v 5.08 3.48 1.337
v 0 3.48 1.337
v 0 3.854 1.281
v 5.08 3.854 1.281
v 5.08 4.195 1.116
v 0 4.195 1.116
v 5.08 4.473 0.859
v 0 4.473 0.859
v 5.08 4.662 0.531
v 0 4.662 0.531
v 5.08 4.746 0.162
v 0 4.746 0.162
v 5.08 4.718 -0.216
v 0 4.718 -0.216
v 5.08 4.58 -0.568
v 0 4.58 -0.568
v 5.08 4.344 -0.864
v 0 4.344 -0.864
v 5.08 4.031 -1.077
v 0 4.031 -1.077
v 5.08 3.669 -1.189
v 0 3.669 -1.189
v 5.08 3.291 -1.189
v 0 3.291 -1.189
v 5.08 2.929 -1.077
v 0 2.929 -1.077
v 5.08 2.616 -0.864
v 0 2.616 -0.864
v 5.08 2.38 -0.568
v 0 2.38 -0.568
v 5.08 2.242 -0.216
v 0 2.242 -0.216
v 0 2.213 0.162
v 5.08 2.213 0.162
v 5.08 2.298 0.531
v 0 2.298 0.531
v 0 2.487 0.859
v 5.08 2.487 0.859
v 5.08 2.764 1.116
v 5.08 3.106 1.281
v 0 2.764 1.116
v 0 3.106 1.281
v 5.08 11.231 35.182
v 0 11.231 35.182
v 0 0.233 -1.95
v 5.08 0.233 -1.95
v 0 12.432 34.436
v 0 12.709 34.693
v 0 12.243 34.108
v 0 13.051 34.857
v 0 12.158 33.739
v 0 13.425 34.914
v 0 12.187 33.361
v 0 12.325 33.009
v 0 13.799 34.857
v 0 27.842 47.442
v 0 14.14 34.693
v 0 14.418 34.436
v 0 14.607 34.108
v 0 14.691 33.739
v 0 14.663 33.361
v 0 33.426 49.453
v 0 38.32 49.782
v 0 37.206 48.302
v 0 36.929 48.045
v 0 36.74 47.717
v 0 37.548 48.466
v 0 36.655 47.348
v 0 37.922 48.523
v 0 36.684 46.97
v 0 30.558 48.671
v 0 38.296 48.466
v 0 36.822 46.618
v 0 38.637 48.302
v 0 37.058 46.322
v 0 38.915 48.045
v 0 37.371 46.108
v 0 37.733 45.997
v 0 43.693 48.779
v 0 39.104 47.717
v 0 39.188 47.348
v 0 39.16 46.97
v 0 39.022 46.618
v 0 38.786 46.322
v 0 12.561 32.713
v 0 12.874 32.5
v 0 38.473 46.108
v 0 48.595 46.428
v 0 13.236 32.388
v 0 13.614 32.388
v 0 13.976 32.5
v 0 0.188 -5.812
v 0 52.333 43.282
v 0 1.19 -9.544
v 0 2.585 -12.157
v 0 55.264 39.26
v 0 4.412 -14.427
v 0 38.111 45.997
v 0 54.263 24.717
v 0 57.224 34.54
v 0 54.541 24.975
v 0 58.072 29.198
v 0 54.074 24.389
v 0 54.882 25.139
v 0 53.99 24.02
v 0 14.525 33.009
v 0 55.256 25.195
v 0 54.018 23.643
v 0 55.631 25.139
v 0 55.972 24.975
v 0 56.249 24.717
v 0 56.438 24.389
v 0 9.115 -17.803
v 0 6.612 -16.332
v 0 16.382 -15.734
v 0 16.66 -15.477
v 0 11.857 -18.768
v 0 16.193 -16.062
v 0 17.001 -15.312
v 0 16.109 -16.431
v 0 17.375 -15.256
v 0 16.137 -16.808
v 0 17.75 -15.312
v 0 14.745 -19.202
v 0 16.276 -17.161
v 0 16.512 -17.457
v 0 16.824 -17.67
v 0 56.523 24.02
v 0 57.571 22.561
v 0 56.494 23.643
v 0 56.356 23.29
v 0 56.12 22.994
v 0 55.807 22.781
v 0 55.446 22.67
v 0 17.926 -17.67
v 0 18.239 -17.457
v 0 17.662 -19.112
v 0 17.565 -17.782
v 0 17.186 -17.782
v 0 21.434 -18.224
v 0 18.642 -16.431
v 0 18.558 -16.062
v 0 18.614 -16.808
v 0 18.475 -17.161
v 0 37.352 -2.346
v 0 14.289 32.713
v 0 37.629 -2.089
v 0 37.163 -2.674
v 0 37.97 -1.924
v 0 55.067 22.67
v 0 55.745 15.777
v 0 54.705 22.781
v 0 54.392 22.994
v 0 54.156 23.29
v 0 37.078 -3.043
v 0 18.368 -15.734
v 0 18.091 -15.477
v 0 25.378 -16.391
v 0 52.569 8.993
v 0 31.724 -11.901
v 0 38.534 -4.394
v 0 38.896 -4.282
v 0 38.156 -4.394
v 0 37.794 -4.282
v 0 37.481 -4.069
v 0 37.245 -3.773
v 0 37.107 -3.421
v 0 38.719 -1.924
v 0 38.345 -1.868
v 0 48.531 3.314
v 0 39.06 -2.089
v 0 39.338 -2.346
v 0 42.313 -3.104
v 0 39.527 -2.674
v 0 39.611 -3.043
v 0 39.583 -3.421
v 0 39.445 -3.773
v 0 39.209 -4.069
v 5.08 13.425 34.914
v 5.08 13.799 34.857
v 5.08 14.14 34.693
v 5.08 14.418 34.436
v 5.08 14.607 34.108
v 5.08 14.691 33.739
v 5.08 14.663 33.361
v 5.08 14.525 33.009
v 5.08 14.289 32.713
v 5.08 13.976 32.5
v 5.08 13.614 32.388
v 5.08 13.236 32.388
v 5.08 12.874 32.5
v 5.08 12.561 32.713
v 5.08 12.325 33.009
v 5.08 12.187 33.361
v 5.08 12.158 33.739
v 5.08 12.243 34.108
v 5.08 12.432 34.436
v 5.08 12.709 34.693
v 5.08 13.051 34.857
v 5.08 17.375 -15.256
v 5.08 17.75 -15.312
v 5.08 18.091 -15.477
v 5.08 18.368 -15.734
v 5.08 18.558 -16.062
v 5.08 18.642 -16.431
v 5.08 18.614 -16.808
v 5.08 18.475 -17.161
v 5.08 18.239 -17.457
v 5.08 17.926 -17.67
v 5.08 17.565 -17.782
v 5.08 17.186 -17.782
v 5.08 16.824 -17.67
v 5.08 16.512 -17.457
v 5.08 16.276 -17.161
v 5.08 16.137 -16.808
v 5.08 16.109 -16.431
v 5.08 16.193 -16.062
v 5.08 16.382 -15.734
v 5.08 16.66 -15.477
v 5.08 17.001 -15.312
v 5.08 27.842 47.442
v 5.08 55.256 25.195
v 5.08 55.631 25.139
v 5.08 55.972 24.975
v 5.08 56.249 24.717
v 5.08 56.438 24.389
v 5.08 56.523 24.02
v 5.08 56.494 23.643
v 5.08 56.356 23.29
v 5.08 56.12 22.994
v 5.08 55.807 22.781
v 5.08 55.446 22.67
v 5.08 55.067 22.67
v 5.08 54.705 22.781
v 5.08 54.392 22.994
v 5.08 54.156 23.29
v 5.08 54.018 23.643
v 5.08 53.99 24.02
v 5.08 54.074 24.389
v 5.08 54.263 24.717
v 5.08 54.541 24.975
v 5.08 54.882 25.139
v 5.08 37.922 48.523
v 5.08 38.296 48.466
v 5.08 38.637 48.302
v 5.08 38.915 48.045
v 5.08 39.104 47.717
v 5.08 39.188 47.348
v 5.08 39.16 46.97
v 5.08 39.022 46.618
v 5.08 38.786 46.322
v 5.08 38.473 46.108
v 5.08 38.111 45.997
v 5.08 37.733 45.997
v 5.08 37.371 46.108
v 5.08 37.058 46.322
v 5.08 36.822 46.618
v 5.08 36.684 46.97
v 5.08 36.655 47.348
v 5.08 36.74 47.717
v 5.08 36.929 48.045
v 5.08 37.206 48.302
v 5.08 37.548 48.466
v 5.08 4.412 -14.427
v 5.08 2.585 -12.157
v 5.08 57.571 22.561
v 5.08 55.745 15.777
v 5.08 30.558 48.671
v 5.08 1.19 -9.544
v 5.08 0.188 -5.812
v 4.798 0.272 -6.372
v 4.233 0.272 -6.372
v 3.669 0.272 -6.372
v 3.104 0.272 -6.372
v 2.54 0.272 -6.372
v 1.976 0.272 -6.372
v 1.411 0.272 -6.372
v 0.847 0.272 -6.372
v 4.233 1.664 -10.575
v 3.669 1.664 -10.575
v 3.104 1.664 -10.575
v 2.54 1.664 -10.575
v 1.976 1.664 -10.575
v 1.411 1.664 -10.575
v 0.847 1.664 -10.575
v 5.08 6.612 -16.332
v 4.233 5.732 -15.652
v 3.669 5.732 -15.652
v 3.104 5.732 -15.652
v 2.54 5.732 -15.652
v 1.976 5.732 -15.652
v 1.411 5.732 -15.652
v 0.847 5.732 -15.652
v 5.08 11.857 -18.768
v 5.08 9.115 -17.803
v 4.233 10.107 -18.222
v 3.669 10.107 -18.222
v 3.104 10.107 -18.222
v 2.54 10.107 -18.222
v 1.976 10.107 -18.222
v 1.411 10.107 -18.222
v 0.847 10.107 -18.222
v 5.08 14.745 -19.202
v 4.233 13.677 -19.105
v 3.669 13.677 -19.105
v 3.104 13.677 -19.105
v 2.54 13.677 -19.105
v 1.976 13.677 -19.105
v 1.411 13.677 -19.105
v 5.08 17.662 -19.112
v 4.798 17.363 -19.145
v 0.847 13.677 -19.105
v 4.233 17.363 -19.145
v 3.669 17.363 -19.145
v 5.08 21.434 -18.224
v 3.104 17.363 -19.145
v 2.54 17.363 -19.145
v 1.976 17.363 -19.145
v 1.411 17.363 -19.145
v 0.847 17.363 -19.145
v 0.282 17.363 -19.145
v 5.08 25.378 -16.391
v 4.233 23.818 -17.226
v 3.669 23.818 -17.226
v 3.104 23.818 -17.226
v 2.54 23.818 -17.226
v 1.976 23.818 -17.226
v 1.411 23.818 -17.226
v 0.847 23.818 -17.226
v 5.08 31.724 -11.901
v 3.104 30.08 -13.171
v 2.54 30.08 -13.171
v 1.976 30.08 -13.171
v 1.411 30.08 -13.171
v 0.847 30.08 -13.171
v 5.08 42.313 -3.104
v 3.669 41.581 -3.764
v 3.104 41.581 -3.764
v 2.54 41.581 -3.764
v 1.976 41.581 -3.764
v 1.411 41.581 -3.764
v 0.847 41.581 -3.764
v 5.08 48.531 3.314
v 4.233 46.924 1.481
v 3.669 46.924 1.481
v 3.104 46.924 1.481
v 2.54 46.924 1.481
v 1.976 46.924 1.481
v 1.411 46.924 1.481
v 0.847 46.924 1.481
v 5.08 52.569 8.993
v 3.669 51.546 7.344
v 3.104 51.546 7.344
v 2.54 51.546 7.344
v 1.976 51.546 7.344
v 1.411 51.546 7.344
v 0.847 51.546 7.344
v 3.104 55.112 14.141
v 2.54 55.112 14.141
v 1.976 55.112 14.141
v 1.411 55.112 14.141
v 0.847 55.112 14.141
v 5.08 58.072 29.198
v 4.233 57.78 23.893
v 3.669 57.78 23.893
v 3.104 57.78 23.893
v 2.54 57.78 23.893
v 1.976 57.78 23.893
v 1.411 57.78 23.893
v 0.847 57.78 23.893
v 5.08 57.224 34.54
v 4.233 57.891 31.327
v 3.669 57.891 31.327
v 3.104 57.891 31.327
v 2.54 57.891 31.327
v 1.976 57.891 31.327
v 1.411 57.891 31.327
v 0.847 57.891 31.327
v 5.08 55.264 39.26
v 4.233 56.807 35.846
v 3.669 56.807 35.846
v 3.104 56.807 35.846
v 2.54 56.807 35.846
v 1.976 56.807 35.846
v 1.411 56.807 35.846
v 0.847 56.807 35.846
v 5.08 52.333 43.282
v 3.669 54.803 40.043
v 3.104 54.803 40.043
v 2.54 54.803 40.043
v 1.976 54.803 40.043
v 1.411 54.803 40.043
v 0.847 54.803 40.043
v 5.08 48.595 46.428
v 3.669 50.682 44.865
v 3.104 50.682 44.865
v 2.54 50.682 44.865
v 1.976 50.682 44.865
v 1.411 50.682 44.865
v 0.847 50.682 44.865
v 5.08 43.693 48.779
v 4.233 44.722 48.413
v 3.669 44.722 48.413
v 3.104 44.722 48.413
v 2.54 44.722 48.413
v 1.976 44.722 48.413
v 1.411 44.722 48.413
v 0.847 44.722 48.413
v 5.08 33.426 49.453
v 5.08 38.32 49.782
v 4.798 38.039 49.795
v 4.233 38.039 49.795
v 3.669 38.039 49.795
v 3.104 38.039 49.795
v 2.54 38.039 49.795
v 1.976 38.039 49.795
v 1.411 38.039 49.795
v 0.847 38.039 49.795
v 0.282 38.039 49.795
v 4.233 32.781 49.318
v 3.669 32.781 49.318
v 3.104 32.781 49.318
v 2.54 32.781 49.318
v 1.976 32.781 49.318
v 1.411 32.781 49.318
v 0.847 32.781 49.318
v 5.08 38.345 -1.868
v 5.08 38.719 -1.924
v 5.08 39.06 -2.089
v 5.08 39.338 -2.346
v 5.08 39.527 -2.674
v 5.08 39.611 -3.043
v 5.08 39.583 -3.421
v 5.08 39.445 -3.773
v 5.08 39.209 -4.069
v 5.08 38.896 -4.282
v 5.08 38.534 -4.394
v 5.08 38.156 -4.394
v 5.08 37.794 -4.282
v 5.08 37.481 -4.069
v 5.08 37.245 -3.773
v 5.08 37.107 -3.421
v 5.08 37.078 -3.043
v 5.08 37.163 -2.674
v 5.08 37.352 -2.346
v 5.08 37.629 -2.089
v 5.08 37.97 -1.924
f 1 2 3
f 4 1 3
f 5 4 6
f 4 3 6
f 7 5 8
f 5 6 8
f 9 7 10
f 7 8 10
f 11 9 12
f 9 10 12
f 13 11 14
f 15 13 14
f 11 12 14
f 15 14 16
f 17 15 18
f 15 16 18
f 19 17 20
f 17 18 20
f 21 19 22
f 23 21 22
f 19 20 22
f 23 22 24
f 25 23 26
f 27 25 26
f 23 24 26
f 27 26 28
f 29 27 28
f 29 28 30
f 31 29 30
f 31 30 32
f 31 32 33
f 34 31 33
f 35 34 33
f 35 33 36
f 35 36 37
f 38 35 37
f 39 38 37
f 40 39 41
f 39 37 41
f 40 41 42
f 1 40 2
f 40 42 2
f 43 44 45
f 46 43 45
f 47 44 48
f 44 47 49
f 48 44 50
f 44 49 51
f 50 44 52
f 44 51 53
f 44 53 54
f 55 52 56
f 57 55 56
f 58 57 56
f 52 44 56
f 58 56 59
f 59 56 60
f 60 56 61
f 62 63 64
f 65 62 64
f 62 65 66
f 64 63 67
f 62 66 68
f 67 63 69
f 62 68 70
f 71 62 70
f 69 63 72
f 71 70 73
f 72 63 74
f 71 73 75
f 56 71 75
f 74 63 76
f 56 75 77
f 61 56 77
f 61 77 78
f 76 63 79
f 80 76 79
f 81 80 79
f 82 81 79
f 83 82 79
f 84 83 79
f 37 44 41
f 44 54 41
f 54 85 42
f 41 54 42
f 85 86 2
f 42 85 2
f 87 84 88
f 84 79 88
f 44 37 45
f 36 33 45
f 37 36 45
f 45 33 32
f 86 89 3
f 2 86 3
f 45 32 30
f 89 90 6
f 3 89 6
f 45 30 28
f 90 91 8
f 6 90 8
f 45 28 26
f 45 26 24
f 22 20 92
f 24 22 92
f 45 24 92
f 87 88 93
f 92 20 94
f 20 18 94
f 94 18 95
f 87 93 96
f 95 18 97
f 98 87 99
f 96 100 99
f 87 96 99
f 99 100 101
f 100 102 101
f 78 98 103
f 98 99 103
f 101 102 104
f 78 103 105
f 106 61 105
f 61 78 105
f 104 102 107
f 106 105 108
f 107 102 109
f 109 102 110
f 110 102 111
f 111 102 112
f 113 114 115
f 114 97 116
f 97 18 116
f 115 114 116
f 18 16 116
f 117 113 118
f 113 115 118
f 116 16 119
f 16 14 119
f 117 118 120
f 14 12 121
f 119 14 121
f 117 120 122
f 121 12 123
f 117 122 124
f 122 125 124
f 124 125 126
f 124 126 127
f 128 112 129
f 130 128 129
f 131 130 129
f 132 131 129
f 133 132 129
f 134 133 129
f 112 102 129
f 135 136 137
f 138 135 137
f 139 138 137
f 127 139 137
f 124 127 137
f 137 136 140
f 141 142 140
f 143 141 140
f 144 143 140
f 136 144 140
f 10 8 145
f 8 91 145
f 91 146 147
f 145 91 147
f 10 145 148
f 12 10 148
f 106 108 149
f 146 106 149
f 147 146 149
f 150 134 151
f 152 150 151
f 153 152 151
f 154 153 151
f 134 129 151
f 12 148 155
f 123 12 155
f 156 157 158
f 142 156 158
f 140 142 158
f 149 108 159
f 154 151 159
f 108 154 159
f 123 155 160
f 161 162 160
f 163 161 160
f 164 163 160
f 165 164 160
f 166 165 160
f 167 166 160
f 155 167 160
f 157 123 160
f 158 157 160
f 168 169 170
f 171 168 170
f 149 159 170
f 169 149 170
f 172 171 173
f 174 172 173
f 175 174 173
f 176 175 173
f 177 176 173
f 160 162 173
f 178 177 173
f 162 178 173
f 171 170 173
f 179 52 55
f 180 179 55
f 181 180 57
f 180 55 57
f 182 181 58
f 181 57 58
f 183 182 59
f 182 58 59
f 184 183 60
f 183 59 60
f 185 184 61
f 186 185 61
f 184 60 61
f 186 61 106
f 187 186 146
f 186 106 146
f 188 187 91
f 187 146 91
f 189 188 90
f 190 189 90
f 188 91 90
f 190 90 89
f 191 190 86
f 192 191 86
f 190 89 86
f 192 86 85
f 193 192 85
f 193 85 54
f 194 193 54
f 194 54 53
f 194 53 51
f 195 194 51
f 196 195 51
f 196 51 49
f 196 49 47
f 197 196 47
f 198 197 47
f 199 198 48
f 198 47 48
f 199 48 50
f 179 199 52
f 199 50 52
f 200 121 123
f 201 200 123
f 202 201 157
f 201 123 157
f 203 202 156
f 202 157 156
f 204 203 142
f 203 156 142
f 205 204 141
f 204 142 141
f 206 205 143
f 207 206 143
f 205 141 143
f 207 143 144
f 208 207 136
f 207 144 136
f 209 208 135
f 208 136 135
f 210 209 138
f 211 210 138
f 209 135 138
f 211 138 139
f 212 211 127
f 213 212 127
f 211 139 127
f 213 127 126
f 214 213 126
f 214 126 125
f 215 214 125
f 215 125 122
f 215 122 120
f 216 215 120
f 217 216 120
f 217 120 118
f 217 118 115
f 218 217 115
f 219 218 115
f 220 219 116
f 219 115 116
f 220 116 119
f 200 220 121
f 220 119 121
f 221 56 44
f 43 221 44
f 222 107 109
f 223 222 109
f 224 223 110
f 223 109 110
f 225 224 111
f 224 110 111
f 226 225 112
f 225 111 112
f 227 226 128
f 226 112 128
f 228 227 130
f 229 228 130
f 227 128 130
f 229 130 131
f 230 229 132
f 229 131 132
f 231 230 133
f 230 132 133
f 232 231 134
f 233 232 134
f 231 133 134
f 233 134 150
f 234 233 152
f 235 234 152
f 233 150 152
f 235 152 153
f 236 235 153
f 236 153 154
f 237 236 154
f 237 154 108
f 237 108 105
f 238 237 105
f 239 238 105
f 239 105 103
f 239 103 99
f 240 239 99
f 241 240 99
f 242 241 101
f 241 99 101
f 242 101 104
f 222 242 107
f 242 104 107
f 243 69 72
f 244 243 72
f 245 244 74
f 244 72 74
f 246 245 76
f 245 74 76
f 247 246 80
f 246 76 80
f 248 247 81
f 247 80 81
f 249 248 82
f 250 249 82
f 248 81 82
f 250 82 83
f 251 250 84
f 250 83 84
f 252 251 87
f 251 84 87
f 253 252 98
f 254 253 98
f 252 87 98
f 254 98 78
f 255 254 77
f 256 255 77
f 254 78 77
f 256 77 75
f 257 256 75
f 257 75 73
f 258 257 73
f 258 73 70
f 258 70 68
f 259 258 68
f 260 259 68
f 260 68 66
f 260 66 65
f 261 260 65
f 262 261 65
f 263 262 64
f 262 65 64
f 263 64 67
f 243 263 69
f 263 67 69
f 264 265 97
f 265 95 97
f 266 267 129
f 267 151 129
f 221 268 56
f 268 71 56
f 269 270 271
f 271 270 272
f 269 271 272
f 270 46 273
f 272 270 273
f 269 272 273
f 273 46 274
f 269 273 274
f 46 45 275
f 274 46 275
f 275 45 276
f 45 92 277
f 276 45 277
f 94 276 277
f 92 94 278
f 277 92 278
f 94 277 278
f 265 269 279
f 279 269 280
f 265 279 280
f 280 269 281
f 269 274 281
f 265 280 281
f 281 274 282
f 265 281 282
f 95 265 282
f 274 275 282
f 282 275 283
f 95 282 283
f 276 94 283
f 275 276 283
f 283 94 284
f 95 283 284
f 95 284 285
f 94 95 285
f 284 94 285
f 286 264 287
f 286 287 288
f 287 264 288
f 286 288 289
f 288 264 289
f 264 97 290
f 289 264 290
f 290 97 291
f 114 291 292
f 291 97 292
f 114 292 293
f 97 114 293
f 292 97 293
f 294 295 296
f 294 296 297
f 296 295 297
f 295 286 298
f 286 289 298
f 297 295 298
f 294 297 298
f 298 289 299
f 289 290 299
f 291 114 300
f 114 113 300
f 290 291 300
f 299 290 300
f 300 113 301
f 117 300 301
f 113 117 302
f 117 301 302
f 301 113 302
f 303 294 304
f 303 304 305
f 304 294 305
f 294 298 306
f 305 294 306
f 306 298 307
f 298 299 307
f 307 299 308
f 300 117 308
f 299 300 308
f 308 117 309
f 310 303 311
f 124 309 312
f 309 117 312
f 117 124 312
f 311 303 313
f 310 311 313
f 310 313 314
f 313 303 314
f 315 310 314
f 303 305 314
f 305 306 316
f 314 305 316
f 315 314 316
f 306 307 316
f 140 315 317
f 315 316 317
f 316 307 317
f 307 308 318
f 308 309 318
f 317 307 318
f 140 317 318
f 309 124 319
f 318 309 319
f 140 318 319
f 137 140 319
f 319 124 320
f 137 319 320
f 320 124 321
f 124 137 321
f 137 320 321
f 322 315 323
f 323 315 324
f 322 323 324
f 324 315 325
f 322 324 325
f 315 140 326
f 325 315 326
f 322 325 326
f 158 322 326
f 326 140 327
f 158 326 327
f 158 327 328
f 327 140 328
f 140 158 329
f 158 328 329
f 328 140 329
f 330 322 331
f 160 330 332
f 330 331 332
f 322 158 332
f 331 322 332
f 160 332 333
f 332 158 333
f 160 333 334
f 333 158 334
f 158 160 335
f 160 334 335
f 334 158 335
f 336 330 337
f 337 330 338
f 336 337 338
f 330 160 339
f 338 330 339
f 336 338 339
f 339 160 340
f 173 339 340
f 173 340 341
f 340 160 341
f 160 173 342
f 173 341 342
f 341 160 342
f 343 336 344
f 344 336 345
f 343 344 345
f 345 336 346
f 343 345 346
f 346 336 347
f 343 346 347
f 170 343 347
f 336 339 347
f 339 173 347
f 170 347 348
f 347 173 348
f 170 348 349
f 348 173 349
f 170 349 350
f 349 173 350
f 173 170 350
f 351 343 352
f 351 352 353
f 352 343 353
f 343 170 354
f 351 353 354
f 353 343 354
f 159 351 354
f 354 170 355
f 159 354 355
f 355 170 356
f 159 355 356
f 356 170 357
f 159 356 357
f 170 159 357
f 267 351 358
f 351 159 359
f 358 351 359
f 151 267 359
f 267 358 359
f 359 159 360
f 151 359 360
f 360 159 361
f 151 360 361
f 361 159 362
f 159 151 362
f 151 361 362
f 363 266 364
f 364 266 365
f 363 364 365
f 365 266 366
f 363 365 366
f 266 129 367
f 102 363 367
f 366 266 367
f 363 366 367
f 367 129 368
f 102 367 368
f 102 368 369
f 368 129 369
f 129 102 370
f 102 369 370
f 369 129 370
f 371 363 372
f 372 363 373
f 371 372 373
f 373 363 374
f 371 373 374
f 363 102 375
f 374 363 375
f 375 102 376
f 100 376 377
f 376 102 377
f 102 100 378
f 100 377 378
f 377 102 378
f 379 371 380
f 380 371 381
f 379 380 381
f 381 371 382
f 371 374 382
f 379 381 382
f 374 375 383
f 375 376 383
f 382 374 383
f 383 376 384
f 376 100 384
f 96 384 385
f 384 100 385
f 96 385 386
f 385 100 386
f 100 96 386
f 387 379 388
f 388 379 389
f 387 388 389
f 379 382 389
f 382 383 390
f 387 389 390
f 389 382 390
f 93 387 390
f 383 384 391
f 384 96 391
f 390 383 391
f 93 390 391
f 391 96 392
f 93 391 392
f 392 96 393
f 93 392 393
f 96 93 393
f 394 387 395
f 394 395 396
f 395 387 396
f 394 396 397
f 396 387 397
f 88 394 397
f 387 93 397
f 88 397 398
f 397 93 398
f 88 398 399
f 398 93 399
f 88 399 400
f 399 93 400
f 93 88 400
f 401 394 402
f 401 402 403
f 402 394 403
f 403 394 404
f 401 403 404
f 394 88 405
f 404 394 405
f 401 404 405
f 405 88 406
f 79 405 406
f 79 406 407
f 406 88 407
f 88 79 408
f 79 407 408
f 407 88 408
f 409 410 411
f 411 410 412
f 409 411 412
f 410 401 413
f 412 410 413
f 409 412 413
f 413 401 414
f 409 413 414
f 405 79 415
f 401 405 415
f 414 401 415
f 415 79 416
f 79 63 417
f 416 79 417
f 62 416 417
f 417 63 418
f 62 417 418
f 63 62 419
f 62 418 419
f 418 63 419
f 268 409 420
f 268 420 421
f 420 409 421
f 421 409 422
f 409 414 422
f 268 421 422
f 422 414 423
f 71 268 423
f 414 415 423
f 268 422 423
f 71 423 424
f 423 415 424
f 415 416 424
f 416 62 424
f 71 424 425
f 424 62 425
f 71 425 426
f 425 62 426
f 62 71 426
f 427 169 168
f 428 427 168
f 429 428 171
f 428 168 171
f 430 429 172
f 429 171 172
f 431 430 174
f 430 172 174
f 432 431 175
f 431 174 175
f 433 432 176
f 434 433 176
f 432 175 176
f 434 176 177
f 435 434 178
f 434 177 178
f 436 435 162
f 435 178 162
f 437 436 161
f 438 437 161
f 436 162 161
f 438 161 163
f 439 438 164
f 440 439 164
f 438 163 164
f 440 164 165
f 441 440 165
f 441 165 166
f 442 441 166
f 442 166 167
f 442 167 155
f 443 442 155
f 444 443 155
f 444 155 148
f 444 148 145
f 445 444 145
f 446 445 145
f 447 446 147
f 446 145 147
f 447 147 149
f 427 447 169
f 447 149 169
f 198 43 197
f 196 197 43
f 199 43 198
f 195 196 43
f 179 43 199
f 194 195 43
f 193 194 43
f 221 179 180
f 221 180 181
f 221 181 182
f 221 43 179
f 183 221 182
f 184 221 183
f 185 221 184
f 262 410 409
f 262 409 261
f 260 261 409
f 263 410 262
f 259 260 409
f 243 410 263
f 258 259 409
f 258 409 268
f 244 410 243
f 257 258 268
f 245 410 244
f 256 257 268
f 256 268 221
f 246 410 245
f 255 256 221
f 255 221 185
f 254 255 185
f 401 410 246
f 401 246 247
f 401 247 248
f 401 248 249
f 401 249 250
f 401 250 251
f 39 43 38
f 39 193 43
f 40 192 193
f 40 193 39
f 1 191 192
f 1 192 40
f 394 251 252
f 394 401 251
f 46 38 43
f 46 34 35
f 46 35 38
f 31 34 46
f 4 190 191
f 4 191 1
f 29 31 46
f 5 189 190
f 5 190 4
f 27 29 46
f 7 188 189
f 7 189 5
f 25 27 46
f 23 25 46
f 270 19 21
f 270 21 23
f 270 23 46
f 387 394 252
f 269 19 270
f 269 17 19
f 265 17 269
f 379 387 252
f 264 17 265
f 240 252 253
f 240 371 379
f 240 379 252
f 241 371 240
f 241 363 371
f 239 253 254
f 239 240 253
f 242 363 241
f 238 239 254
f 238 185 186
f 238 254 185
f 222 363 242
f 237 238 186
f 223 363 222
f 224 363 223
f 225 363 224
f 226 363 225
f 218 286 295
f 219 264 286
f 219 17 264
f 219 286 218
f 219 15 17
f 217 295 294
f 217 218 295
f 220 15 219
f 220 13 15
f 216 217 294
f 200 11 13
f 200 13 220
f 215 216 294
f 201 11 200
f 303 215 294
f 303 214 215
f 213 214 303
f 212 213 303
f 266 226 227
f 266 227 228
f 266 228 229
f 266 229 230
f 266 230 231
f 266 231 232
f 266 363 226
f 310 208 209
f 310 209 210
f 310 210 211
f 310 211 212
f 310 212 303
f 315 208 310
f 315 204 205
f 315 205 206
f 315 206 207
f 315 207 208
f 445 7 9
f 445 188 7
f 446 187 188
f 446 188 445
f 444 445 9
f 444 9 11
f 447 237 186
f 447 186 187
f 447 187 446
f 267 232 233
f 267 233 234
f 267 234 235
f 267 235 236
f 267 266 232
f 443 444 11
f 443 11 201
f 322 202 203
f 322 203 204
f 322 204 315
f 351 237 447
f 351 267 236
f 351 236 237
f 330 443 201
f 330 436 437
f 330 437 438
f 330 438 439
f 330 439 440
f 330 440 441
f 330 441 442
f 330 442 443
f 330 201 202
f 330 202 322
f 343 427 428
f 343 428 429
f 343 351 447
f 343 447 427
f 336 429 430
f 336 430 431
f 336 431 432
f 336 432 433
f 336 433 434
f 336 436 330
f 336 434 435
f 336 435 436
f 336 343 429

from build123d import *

# Parameters (mm, degrees)
BOSS_EXTRUDE1_DEPTH = 5.08
SKETCH4_R           = 1.27
CUT_EXTRUDE1_DEPTH  = 5.08


with BuildPart() as part:
    # Sketch3 → Boss-Extrude1 (new body)
    with BuildSketch(Plane(origin=(0, 0, 0), x_dir=(0, 0, -1), z_dir=(1, 0, 0))):
        with BuildLine():
            Line((-47.441668349, 27.842074628), (-35.181732411, 11.231316753))
            Line((-35.181732411, 11.231316753), (1.949605381, 0.233471835))
            add(Edge.make_bspline(
                [(1.949605381, 0.233471835), (4.890290938, -0.232032838), (10.160071566, 0.735147888), (15.611977012, 5.149067238), (18.884368216, 10.647091461), (19.674030919, 17.241164019), (17.440635046, 24.216151913), (13.232560428, 30.12920969), (8.551401796, 35.89852438), (3.827620866, 41.665894045), (-1.370765068, 47.027165705), (-7.261234365, 51.79701328), (-14.7784376, 55.698212535), (-22.952033614, 57.992508455), (-31.974324582, 58.334446998), (-39.470610931, 55.71072363), (-45.272350716, 50.773717258), (-48.759778621, 44.89399317), (-50.430145497, 36.809256899), (-49.168255002, 30.946562306), (-47.441668349, 27.842074628)],
                knots=[0, 0, 0, 0, 0.064655629, 0.112182171, 0.149245604, 0.202687261, 0.251878753, 0.306377364, 0.36071414, 0.414932945, 0.469634396, 0.524171798, 0.580244221, 0.654105555, 0.708421188, 0.775974658, 0.822312066, 0.872983652, 0.922833719, 1, 1, 1, 1], degree=3))
        make_face()
    extrude(amount=BOSS_EXTRUDE1_DEPTH)

    # Sketch4 → Cut-Extrude1 (cut)
    with BuildSketch(Plane.ZY):
        with Locations((33.643824541, 13.424879002)):
            Circle(SKETCH4_R)
        with Locations((47.252672641, 37.921847406)):
            Circle(SKETCH4_R)
        with Locations((23.925350422, 55.256282012)):
            Circle(SKETCH4_R)
        with Locations((-3.138060322, 38.344834007)):
            Circle(SKETCH4_R)
        with Locations((-16.525859122, 17.375384785)):
            Circle(SKETCH4_R)
        with Locations((0.06701047, 3.47984023)):
            Circle(SKETCH4_R)
    extrude(amount=-CUT_EXTRUDE1_DEPTH, mode=Mode.SUBTRACT)


solid = part.part
